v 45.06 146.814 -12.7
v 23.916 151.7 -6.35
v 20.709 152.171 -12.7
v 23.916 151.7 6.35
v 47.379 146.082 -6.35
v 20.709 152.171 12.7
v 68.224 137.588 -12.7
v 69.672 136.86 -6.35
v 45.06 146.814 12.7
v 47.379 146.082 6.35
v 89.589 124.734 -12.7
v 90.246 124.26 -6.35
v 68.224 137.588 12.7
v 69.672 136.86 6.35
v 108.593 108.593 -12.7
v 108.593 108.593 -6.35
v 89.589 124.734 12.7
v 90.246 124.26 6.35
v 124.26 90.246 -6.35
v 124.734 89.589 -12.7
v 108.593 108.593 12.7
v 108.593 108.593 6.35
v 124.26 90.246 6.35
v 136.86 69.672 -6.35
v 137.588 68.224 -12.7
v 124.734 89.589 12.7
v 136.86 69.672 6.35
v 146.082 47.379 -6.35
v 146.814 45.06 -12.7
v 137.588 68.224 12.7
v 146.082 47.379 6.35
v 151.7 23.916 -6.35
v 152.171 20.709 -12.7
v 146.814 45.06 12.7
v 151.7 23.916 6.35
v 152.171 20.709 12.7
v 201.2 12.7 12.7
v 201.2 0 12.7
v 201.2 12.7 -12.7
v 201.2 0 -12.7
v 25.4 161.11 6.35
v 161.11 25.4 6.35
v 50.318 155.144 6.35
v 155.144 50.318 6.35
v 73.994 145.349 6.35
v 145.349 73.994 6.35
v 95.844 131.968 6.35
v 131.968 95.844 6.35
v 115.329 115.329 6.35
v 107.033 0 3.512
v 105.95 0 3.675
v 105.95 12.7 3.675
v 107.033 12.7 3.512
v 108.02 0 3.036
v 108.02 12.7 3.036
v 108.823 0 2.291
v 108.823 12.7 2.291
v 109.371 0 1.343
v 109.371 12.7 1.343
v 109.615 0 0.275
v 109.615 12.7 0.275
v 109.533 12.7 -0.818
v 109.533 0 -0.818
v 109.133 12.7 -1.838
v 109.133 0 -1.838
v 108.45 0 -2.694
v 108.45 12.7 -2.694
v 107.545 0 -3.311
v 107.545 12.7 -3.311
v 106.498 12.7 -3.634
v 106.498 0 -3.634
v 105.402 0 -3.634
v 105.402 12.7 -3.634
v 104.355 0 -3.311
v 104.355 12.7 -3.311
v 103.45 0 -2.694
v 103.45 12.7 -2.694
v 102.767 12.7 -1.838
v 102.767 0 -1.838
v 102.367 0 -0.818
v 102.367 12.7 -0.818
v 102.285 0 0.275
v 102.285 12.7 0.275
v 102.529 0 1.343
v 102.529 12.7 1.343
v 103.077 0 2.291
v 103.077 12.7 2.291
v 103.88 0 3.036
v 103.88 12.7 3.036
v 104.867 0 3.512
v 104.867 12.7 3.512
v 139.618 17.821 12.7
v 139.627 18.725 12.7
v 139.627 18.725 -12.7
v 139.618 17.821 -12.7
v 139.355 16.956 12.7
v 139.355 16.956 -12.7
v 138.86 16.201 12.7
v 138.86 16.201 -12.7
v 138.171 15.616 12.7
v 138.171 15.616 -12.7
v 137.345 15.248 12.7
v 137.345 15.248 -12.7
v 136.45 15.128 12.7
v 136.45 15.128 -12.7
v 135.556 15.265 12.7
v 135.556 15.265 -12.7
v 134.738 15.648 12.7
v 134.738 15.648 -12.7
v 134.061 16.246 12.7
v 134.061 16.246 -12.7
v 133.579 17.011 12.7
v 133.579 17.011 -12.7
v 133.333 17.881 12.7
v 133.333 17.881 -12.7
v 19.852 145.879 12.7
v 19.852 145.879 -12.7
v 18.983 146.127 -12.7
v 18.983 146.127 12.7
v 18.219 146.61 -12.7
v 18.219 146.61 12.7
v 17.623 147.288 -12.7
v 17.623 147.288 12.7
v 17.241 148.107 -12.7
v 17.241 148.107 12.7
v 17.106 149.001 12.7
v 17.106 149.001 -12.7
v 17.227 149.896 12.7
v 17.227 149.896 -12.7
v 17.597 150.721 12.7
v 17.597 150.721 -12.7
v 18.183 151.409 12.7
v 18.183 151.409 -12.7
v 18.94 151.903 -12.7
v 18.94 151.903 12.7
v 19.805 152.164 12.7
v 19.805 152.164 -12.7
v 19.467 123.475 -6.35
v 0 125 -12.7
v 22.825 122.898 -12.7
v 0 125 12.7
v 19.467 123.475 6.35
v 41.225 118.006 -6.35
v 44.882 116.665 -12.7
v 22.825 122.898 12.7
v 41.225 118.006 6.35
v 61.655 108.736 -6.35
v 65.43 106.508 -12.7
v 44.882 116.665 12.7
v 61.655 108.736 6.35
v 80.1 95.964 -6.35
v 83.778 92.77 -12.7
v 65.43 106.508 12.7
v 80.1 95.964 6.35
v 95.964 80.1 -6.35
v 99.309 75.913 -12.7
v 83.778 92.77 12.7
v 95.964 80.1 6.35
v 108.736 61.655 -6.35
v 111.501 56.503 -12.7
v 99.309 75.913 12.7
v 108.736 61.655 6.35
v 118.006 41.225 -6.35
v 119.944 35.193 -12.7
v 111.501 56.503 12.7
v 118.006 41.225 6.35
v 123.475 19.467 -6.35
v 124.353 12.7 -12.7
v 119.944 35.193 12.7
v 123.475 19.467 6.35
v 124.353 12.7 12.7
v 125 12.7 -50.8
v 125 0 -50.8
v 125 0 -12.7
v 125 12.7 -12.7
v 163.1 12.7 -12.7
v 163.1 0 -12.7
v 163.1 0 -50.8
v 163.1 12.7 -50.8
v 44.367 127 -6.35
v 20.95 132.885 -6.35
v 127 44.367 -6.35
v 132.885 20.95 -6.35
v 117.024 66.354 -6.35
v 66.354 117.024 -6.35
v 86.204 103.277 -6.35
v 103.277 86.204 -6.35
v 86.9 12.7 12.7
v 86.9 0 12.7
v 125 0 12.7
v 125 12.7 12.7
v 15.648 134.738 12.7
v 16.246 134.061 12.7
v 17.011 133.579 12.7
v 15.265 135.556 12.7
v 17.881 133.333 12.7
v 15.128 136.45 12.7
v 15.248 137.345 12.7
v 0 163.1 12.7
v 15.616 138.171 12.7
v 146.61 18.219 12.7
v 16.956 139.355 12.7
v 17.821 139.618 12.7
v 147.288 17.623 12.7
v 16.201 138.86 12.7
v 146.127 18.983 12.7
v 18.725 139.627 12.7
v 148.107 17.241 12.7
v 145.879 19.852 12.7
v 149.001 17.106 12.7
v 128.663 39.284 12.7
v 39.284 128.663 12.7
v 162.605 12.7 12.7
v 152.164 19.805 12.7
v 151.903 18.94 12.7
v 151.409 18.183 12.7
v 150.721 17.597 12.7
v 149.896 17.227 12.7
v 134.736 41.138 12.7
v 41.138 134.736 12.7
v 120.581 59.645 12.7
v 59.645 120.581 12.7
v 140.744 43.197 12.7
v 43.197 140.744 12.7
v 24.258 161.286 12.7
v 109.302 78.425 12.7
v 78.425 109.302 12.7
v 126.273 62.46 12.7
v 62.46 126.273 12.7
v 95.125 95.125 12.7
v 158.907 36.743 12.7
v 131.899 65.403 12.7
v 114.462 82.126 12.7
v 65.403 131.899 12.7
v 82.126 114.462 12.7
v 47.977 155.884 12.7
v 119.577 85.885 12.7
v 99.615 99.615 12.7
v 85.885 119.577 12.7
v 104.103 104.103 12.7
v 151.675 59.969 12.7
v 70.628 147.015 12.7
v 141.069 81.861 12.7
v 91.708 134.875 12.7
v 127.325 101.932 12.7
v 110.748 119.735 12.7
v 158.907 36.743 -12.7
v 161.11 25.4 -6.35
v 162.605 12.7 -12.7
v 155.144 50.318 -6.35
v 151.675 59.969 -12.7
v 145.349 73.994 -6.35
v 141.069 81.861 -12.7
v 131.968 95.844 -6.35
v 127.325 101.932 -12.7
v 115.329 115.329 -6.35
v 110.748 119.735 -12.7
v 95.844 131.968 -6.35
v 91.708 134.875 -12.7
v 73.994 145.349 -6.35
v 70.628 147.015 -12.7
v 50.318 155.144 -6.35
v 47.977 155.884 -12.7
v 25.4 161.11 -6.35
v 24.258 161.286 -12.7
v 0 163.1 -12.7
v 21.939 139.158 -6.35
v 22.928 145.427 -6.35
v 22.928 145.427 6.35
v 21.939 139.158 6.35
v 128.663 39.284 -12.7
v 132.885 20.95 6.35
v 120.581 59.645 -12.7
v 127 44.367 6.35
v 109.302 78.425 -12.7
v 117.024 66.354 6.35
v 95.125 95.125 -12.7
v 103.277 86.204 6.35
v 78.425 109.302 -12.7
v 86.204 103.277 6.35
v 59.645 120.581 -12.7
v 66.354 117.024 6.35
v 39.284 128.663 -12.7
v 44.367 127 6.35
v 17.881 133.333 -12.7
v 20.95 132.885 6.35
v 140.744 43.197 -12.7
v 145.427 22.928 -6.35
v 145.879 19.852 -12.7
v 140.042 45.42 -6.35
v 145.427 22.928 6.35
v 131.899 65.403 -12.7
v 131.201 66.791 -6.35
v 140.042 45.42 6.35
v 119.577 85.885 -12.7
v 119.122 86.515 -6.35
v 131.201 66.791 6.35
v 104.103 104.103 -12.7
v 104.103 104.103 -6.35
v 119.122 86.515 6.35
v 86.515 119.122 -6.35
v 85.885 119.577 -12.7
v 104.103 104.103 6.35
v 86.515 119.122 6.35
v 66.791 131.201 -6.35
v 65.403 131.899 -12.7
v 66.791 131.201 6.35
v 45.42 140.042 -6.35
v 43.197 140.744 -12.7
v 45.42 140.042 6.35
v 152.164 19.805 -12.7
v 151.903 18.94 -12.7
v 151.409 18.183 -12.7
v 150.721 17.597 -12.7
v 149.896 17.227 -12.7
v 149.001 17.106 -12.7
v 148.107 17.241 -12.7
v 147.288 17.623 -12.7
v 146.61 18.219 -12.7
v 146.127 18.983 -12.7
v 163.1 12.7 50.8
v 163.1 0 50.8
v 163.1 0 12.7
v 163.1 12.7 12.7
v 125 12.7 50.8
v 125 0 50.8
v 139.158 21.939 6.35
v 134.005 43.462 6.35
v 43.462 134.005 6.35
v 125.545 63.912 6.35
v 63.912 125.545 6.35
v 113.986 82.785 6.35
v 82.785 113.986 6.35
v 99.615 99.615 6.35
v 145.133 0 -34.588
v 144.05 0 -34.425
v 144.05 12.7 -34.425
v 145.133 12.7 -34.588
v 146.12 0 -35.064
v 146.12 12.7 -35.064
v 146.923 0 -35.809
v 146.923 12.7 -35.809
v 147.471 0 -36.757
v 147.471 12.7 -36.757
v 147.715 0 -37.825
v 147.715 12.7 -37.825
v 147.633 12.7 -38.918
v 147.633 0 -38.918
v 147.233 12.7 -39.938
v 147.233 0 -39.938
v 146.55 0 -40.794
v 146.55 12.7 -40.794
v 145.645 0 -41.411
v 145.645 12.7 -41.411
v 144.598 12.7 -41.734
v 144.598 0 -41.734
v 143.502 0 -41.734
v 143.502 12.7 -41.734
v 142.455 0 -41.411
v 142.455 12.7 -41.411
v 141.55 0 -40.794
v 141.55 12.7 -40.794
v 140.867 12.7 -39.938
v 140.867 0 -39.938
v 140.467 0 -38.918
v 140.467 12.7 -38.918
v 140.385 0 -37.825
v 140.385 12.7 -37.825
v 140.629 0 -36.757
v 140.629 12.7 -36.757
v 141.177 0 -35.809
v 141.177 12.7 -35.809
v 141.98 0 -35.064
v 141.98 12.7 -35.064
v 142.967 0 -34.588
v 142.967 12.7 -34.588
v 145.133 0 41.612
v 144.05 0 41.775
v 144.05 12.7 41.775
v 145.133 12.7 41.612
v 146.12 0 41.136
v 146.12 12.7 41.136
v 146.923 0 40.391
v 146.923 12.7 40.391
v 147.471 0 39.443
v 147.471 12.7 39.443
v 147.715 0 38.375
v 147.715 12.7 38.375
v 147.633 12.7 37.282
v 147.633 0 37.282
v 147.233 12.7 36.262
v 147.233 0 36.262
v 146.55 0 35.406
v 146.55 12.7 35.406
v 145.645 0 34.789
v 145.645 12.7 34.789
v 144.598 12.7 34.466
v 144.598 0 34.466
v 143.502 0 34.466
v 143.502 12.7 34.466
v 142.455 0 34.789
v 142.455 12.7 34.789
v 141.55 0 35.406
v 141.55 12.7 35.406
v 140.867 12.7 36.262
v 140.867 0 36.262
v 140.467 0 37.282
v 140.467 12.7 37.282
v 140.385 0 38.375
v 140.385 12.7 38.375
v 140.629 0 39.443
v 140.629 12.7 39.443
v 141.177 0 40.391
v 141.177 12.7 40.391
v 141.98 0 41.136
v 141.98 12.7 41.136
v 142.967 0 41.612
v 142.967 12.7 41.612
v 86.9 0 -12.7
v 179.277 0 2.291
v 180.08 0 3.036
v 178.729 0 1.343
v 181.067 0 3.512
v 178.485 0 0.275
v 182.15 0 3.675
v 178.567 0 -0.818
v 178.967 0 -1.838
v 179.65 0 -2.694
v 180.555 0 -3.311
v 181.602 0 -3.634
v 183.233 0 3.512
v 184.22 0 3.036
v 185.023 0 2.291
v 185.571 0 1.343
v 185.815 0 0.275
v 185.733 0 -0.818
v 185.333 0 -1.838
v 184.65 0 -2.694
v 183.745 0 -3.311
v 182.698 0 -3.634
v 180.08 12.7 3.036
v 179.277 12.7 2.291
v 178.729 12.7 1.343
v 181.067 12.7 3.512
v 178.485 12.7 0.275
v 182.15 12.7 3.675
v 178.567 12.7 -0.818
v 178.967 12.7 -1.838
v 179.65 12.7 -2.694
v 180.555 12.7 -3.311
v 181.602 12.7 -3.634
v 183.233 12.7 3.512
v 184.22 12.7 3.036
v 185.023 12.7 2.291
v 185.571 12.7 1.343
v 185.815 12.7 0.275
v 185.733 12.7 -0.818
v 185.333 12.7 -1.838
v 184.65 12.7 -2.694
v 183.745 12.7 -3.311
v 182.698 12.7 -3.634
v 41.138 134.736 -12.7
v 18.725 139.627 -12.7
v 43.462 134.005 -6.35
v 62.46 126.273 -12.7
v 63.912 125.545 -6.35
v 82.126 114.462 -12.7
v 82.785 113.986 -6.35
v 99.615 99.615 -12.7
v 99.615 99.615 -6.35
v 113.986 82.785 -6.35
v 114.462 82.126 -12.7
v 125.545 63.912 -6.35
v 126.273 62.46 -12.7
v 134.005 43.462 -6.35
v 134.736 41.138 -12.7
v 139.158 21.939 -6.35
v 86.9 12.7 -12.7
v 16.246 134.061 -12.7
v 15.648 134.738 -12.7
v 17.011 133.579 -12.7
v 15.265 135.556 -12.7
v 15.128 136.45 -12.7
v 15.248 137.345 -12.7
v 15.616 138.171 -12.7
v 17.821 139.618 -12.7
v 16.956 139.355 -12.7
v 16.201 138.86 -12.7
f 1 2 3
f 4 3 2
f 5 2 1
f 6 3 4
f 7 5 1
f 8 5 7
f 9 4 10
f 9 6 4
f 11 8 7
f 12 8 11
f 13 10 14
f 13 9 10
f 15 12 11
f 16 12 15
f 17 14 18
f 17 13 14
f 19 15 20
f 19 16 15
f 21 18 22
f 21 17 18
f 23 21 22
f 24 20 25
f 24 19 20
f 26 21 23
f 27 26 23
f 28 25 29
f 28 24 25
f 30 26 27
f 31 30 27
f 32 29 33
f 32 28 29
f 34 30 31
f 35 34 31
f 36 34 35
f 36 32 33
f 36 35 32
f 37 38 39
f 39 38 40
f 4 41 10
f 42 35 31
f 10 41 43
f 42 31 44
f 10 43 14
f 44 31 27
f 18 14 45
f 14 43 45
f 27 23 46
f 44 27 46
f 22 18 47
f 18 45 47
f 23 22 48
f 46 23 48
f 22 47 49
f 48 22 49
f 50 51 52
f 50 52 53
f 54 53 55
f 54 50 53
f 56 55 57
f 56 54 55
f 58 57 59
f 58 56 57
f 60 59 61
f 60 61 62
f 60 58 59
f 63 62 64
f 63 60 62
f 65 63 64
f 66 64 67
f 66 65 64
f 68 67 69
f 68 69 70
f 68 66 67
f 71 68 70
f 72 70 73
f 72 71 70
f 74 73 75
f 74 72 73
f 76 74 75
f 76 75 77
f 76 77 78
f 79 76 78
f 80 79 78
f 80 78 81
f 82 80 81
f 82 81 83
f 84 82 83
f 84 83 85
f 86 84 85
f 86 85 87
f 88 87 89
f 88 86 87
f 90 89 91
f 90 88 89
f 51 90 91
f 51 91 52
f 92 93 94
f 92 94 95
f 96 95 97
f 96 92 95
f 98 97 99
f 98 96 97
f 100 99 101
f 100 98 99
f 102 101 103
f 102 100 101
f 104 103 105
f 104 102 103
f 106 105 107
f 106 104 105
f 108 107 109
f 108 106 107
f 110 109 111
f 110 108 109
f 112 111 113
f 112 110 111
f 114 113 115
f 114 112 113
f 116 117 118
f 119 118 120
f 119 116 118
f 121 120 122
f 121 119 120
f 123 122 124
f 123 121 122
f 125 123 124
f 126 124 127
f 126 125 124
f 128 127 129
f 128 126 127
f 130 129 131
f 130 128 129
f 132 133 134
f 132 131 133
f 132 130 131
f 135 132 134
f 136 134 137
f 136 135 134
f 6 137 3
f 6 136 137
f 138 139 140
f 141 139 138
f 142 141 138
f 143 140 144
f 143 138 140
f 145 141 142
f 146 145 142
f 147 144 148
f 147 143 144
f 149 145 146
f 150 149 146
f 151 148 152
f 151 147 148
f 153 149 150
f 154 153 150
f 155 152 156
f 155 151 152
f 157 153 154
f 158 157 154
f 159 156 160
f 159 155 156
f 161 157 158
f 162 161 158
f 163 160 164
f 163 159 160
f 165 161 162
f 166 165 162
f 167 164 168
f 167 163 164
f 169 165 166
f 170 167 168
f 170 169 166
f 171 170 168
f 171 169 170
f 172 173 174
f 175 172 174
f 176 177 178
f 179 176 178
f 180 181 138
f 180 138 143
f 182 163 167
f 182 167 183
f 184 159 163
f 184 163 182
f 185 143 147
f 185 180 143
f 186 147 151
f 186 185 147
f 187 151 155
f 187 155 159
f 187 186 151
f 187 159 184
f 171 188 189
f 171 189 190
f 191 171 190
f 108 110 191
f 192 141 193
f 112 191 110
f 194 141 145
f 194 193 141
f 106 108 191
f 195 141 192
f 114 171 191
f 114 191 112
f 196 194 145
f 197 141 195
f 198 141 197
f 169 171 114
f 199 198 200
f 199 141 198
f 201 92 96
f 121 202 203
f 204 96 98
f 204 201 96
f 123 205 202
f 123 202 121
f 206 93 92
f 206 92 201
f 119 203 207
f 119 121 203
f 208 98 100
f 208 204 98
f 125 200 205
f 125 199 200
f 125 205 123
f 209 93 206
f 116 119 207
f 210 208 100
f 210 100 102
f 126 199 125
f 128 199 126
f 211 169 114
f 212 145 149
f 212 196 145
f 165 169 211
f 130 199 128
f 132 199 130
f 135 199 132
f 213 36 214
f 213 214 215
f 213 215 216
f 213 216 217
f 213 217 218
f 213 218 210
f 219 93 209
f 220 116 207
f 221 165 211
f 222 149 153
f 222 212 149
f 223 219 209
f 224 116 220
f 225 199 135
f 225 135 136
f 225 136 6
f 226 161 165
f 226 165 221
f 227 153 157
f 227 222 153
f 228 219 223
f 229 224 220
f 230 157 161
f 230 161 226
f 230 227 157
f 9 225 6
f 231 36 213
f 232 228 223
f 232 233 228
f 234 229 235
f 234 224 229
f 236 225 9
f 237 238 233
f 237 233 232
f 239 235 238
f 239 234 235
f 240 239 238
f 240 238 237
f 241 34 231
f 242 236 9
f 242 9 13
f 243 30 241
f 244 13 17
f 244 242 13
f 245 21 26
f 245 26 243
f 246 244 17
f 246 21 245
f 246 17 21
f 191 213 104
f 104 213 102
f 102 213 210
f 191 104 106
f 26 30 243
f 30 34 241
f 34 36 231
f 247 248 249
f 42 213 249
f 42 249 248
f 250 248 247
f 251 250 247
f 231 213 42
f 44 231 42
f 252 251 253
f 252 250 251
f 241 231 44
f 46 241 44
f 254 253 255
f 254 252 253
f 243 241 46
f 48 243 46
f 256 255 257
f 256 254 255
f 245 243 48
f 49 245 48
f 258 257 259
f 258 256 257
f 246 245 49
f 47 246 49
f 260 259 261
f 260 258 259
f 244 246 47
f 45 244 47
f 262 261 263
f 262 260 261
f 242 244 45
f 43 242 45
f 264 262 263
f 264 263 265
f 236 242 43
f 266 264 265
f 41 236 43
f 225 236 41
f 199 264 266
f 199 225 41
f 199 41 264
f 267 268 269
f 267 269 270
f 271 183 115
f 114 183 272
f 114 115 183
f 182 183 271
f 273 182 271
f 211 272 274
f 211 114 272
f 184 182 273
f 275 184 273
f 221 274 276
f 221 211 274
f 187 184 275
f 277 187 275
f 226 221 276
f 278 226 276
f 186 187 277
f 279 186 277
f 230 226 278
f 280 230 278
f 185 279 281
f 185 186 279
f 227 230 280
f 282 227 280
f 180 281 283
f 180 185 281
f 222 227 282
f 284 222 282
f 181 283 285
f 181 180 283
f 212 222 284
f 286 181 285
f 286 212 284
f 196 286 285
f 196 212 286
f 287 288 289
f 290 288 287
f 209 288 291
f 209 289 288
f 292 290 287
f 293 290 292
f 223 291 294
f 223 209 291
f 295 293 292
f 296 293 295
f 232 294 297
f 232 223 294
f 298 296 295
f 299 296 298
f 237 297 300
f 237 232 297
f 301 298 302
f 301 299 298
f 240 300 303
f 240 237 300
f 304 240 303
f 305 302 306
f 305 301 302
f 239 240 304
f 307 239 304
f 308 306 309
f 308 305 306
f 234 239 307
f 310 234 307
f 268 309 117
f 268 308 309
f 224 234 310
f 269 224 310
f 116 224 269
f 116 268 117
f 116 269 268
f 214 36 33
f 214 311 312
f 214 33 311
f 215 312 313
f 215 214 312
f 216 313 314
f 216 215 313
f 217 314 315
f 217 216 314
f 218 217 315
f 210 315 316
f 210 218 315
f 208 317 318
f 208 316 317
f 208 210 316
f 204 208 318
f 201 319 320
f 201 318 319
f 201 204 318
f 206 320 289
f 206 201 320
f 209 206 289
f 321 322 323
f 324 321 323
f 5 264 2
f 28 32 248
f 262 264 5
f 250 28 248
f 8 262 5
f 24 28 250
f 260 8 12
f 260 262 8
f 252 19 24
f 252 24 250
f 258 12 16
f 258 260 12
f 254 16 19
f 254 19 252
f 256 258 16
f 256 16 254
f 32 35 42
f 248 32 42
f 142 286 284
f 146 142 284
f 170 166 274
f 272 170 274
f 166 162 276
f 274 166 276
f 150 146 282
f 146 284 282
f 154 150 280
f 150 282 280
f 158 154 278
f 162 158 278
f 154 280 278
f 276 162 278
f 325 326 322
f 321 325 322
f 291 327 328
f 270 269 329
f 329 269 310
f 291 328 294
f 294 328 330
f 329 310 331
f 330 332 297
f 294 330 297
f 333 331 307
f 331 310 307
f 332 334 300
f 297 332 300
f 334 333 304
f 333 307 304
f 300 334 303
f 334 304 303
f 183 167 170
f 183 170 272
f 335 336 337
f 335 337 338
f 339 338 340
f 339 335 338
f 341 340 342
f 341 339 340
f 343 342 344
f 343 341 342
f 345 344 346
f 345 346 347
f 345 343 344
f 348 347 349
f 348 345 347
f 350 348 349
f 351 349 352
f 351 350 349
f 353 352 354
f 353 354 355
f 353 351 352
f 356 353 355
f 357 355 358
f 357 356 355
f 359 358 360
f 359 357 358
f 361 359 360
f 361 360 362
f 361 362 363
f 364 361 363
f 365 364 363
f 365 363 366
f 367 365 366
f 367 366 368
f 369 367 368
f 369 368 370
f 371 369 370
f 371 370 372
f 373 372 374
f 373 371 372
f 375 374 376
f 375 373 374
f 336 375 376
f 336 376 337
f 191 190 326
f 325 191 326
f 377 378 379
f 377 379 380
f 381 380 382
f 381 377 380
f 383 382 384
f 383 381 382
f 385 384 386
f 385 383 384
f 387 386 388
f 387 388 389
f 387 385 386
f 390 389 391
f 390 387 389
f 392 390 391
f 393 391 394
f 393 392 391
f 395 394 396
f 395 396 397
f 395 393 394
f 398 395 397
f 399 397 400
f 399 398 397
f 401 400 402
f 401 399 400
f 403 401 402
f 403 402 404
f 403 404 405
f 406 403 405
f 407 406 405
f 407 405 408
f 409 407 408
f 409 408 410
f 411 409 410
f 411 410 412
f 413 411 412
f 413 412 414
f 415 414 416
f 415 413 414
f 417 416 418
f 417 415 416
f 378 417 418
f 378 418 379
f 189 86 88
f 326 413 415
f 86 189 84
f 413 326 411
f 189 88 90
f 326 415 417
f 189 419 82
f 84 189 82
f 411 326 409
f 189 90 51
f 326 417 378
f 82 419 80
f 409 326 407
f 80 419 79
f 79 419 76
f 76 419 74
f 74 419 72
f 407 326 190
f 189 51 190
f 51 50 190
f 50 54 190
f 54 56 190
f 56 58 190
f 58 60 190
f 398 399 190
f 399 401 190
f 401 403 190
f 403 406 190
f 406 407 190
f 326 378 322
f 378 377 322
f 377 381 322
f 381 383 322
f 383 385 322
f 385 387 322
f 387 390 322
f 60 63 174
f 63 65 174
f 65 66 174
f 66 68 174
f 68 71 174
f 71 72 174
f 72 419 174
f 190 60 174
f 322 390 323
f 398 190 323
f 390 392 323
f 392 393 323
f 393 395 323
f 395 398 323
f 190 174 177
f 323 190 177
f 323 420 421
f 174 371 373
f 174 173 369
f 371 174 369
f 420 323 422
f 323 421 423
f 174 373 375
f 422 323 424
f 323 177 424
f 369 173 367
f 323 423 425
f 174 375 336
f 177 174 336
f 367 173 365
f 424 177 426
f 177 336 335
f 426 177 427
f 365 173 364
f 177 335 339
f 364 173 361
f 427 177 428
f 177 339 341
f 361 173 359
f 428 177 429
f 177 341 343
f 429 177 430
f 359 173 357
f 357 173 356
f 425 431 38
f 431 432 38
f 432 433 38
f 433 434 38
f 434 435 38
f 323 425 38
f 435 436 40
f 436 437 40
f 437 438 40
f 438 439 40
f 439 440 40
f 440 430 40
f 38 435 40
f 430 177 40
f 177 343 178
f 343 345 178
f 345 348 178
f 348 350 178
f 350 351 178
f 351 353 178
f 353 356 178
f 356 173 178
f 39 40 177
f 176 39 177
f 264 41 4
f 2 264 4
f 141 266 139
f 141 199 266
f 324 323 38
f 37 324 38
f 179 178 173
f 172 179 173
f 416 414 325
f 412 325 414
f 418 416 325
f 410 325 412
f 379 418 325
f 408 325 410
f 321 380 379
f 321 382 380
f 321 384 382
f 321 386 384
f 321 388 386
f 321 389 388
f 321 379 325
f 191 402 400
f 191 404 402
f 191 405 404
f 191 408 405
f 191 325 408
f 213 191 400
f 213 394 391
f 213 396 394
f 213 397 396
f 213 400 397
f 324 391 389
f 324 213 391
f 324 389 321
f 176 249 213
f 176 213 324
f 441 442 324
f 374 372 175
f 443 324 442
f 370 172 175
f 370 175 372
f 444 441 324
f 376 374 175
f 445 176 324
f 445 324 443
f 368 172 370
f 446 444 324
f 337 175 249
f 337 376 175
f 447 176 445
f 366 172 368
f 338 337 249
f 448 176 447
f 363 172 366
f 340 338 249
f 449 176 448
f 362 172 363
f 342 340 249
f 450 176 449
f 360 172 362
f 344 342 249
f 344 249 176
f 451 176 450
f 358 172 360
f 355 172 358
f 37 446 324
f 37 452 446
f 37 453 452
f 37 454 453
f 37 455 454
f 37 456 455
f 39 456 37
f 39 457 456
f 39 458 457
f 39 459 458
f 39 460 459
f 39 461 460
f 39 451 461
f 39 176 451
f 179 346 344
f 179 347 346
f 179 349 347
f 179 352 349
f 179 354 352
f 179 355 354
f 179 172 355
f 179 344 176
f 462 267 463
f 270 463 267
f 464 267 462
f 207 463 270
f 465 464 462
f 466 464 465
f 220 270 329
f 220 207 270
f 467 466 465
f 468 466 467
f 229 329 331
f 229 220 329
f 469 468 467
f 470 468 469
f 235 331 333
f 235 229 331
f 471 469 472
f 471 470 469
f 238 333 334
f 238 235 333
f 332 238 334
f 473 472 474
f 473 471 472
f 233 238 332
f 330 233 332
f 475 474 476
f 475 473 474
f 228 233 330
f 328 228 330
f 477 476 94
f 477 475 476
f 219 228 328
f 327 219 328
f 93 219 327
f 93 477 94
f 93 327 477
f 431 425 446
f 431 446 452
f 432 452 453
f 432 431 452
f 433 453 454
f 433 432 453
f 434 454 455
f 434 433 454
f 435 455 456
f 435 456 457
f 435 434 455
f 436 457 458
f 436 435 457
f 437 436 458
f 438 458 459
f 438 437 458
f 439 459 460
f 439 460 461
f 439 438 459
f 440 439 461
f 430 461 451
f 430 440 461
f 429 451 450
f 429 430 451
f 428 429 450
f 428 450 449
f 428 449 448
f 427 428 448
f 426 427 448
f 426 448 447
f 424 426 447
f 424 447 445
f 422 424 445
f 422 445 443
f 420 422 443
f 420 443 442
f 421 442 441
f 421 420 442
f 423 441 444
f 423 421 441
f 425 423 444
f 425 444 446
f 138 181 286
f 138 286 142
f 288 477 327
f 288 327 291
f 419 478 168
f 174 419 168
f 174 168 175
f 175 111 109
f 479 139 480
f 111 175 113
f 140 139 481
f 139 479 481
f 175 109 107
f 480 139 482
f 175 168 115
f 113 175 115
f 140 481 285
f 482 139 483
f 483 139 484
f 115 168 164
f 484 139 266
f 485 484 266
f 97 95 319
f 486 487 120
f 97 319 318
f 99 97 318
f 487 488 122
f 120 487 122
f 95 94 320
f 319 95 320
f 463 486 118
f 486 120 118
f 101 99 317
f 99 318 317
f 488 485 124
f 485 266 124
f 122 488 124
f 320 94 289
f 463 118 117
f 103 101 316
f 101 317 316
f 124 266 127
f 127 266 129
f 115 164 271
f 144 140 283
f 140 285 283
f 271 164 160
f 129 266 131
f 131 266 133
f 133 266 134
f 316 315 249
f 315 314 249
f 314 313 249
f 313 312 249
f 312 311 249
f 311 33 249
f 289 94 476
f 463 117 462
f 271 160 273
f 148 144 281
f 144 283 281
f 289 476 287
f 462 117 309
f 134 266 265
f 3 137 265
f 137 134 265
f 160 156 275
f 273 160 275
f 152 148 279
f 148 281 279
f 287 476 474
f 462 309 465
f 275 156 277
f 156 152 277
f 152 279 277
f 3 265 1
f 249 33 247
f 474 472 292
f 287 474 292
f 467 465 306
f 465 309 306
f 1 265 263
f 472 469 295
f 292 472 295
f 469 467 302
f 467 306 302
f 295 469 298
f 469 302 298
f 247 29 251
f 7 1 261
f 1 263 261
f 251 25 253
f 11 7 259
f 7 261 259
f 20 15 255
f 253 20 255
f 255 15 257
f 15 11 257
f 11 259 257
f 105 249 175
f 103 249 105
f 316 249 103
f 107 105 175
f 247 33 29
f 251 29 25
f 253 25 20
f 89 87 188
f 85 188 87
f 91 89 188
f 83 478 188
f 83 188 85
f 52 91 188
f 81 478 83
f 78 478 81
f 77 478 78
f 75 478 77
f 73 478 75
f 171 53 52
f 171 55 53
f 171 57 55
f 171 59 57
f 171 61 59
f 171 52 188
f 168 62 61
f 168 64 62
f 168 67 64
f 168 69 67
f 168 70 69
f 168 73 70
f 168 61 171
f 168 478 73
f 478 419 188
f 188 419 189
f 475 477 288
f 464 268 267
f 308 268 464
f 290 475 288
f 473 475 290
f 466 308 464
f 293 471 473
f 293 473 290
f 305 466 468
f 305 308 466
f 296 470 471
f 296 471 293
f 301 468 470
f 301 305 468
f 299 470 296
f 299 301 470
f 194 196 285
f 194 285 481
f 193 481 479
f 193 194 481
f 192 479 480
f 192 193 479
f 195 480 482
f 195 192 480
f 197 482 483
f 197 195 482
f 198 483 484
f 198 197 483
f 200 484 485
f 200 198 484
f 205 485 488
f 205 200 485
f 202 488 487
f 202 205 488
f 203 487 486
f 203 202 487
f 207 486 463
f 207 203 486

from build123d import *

# Parameters (mm, degrees)
BOSS_EXTRUDE1_DEPTH = 12.7
CUT_EXTRUDE1_DEPTH  = 6.35
CUT_EXTRUDE2_DEPTH  = 233.052537155
SKETCH5_R           = 3.675
BOSS_EXTRUDE2_DEPTH = 12.7


with BuildPart() as part:
    # Sketch1 → Boss-Extrude1 (new, symmetric)
    with BuildSketch(Plane.XY):
        with BuildLine():
            Line((0, 163.1), (0, 125))
            ThreePointArc((0, 125), (88.388347648, 88.388347648), (125, 0))
            Line((125, 0), (163.1, 0))
            ThreePointArc((163.1, 0), (115.329116012, 115.329116012), (0, 163.1))
        make_face()
    extrude(amount=BOSS_EXTRUDE1_DEPTH, both=True)

    # Sketch3 → Cut-Extrude1 (cut, symmetric)
    with BuildSketch(Plane.XY):
        with BuildLine():
            Line((25.4, 161.110055552), (19.466584917, 123.474904623))
            ThreePointArc((19.466584917, 123.474904623), (88.388347648, 88.388347648), (123.474904623, 19.466584917))
            Line((123.474904623, 19.466584917), (161.110055552, 25.4))
            ThreePointArc((161.110055552, 25.4), (115.329116012, 115.329116012), (25.4, 161.110055552))
        make_face()
    extrude(amount=CUT_EXTRUDE1_DEPTH, both=True, mode=Mode.SUBTRACT)

    # Sketch4 → Cut-Extrude2 (cut, through all)
    with BuildSketch(Plane.XY.offset(12.7)):
        with BuildLine():
            ThreePointArc((18.724684767, 139.626667691), (99.614808513, 99.614808513), (139.626667691, 18.724684767))
            ThreePointArc((139.626667691, 18.724684767), (136.90184543, 15.155849254), (133.333009917, 17.880671515))
            ThreePointArc((133.333009917, 17.880671515), (95.124681201, 95.124681201), (17.880671515, 133.333009917))
            ThreePointArc((17.880671515, 133.333009917), (15.155849254, 136.90184543), (18.724684767, 139.626667691))
        make_face()
        with BuildLine():
            ThreePointArc((20.708615854, 152.170890392), (108.592878802, 108.592878802), (152.170890392, 20.708615854))
            ThreePointArc((152.170890392, 20.708615854), (149.453021799, 17.134481891), (145.878887836, 19.852350483))
            ThreePointArc((145.878887836, 19.852350483), (104.102751491, 104.102751491), (19.852350483, 145.878887836))
            ThreePointArc((19.852350483, 145.878887836), (17.134481891, 149.453021799), (20.708615854, 152.170890392))
        make_face()
    extrude(amount=-CUT_EXTRUDE2_DEPTH, mode=Mode.SUBTRACT)

    # Sketch5 → Boss-Extrude2 (add)
    with BuildSketch(Plane(origin=(0, 0, 0), x_dir=(1, 0, 0), z_dir=(0, 1, 0))):
        Polygon((163.1, -12.7), (201.2, -12.7), (201.2, 12.7), (163.1, 12.7), (163.1, 50.8), (125, 50.8), (125, 12.7), (86.9, 12.7), (86.9, -12.7), (125, -12.7), (125, -50.8), (163.1, -50.8), align=None)
        with Locations(Location((105.95, 0, 0), (0, 0, 270))):
            Circle(SKETCH5_R, mode=Mode.SUBTRACT)
        with Locations(Location((182.15, 0, 0), (0, 0, 270))):
            Circle(SKETCH5_R, mode=Mode.SUBTRACT)
        with Locations(Location((144.05, -38.1, 0), (0, 0, 270))):
            Circle(SKETCH5_R, mode=Mode.SUBTRACT)
        with Locations(Location((144.05, 38.1, 0), (0, 0, 270))):
            Circle(SKETCH5_R, mode=Mode.SUBTRACT)
    extrude(amount=BOSS_EXTRUDE2_DEPTH)


solid = part.part
